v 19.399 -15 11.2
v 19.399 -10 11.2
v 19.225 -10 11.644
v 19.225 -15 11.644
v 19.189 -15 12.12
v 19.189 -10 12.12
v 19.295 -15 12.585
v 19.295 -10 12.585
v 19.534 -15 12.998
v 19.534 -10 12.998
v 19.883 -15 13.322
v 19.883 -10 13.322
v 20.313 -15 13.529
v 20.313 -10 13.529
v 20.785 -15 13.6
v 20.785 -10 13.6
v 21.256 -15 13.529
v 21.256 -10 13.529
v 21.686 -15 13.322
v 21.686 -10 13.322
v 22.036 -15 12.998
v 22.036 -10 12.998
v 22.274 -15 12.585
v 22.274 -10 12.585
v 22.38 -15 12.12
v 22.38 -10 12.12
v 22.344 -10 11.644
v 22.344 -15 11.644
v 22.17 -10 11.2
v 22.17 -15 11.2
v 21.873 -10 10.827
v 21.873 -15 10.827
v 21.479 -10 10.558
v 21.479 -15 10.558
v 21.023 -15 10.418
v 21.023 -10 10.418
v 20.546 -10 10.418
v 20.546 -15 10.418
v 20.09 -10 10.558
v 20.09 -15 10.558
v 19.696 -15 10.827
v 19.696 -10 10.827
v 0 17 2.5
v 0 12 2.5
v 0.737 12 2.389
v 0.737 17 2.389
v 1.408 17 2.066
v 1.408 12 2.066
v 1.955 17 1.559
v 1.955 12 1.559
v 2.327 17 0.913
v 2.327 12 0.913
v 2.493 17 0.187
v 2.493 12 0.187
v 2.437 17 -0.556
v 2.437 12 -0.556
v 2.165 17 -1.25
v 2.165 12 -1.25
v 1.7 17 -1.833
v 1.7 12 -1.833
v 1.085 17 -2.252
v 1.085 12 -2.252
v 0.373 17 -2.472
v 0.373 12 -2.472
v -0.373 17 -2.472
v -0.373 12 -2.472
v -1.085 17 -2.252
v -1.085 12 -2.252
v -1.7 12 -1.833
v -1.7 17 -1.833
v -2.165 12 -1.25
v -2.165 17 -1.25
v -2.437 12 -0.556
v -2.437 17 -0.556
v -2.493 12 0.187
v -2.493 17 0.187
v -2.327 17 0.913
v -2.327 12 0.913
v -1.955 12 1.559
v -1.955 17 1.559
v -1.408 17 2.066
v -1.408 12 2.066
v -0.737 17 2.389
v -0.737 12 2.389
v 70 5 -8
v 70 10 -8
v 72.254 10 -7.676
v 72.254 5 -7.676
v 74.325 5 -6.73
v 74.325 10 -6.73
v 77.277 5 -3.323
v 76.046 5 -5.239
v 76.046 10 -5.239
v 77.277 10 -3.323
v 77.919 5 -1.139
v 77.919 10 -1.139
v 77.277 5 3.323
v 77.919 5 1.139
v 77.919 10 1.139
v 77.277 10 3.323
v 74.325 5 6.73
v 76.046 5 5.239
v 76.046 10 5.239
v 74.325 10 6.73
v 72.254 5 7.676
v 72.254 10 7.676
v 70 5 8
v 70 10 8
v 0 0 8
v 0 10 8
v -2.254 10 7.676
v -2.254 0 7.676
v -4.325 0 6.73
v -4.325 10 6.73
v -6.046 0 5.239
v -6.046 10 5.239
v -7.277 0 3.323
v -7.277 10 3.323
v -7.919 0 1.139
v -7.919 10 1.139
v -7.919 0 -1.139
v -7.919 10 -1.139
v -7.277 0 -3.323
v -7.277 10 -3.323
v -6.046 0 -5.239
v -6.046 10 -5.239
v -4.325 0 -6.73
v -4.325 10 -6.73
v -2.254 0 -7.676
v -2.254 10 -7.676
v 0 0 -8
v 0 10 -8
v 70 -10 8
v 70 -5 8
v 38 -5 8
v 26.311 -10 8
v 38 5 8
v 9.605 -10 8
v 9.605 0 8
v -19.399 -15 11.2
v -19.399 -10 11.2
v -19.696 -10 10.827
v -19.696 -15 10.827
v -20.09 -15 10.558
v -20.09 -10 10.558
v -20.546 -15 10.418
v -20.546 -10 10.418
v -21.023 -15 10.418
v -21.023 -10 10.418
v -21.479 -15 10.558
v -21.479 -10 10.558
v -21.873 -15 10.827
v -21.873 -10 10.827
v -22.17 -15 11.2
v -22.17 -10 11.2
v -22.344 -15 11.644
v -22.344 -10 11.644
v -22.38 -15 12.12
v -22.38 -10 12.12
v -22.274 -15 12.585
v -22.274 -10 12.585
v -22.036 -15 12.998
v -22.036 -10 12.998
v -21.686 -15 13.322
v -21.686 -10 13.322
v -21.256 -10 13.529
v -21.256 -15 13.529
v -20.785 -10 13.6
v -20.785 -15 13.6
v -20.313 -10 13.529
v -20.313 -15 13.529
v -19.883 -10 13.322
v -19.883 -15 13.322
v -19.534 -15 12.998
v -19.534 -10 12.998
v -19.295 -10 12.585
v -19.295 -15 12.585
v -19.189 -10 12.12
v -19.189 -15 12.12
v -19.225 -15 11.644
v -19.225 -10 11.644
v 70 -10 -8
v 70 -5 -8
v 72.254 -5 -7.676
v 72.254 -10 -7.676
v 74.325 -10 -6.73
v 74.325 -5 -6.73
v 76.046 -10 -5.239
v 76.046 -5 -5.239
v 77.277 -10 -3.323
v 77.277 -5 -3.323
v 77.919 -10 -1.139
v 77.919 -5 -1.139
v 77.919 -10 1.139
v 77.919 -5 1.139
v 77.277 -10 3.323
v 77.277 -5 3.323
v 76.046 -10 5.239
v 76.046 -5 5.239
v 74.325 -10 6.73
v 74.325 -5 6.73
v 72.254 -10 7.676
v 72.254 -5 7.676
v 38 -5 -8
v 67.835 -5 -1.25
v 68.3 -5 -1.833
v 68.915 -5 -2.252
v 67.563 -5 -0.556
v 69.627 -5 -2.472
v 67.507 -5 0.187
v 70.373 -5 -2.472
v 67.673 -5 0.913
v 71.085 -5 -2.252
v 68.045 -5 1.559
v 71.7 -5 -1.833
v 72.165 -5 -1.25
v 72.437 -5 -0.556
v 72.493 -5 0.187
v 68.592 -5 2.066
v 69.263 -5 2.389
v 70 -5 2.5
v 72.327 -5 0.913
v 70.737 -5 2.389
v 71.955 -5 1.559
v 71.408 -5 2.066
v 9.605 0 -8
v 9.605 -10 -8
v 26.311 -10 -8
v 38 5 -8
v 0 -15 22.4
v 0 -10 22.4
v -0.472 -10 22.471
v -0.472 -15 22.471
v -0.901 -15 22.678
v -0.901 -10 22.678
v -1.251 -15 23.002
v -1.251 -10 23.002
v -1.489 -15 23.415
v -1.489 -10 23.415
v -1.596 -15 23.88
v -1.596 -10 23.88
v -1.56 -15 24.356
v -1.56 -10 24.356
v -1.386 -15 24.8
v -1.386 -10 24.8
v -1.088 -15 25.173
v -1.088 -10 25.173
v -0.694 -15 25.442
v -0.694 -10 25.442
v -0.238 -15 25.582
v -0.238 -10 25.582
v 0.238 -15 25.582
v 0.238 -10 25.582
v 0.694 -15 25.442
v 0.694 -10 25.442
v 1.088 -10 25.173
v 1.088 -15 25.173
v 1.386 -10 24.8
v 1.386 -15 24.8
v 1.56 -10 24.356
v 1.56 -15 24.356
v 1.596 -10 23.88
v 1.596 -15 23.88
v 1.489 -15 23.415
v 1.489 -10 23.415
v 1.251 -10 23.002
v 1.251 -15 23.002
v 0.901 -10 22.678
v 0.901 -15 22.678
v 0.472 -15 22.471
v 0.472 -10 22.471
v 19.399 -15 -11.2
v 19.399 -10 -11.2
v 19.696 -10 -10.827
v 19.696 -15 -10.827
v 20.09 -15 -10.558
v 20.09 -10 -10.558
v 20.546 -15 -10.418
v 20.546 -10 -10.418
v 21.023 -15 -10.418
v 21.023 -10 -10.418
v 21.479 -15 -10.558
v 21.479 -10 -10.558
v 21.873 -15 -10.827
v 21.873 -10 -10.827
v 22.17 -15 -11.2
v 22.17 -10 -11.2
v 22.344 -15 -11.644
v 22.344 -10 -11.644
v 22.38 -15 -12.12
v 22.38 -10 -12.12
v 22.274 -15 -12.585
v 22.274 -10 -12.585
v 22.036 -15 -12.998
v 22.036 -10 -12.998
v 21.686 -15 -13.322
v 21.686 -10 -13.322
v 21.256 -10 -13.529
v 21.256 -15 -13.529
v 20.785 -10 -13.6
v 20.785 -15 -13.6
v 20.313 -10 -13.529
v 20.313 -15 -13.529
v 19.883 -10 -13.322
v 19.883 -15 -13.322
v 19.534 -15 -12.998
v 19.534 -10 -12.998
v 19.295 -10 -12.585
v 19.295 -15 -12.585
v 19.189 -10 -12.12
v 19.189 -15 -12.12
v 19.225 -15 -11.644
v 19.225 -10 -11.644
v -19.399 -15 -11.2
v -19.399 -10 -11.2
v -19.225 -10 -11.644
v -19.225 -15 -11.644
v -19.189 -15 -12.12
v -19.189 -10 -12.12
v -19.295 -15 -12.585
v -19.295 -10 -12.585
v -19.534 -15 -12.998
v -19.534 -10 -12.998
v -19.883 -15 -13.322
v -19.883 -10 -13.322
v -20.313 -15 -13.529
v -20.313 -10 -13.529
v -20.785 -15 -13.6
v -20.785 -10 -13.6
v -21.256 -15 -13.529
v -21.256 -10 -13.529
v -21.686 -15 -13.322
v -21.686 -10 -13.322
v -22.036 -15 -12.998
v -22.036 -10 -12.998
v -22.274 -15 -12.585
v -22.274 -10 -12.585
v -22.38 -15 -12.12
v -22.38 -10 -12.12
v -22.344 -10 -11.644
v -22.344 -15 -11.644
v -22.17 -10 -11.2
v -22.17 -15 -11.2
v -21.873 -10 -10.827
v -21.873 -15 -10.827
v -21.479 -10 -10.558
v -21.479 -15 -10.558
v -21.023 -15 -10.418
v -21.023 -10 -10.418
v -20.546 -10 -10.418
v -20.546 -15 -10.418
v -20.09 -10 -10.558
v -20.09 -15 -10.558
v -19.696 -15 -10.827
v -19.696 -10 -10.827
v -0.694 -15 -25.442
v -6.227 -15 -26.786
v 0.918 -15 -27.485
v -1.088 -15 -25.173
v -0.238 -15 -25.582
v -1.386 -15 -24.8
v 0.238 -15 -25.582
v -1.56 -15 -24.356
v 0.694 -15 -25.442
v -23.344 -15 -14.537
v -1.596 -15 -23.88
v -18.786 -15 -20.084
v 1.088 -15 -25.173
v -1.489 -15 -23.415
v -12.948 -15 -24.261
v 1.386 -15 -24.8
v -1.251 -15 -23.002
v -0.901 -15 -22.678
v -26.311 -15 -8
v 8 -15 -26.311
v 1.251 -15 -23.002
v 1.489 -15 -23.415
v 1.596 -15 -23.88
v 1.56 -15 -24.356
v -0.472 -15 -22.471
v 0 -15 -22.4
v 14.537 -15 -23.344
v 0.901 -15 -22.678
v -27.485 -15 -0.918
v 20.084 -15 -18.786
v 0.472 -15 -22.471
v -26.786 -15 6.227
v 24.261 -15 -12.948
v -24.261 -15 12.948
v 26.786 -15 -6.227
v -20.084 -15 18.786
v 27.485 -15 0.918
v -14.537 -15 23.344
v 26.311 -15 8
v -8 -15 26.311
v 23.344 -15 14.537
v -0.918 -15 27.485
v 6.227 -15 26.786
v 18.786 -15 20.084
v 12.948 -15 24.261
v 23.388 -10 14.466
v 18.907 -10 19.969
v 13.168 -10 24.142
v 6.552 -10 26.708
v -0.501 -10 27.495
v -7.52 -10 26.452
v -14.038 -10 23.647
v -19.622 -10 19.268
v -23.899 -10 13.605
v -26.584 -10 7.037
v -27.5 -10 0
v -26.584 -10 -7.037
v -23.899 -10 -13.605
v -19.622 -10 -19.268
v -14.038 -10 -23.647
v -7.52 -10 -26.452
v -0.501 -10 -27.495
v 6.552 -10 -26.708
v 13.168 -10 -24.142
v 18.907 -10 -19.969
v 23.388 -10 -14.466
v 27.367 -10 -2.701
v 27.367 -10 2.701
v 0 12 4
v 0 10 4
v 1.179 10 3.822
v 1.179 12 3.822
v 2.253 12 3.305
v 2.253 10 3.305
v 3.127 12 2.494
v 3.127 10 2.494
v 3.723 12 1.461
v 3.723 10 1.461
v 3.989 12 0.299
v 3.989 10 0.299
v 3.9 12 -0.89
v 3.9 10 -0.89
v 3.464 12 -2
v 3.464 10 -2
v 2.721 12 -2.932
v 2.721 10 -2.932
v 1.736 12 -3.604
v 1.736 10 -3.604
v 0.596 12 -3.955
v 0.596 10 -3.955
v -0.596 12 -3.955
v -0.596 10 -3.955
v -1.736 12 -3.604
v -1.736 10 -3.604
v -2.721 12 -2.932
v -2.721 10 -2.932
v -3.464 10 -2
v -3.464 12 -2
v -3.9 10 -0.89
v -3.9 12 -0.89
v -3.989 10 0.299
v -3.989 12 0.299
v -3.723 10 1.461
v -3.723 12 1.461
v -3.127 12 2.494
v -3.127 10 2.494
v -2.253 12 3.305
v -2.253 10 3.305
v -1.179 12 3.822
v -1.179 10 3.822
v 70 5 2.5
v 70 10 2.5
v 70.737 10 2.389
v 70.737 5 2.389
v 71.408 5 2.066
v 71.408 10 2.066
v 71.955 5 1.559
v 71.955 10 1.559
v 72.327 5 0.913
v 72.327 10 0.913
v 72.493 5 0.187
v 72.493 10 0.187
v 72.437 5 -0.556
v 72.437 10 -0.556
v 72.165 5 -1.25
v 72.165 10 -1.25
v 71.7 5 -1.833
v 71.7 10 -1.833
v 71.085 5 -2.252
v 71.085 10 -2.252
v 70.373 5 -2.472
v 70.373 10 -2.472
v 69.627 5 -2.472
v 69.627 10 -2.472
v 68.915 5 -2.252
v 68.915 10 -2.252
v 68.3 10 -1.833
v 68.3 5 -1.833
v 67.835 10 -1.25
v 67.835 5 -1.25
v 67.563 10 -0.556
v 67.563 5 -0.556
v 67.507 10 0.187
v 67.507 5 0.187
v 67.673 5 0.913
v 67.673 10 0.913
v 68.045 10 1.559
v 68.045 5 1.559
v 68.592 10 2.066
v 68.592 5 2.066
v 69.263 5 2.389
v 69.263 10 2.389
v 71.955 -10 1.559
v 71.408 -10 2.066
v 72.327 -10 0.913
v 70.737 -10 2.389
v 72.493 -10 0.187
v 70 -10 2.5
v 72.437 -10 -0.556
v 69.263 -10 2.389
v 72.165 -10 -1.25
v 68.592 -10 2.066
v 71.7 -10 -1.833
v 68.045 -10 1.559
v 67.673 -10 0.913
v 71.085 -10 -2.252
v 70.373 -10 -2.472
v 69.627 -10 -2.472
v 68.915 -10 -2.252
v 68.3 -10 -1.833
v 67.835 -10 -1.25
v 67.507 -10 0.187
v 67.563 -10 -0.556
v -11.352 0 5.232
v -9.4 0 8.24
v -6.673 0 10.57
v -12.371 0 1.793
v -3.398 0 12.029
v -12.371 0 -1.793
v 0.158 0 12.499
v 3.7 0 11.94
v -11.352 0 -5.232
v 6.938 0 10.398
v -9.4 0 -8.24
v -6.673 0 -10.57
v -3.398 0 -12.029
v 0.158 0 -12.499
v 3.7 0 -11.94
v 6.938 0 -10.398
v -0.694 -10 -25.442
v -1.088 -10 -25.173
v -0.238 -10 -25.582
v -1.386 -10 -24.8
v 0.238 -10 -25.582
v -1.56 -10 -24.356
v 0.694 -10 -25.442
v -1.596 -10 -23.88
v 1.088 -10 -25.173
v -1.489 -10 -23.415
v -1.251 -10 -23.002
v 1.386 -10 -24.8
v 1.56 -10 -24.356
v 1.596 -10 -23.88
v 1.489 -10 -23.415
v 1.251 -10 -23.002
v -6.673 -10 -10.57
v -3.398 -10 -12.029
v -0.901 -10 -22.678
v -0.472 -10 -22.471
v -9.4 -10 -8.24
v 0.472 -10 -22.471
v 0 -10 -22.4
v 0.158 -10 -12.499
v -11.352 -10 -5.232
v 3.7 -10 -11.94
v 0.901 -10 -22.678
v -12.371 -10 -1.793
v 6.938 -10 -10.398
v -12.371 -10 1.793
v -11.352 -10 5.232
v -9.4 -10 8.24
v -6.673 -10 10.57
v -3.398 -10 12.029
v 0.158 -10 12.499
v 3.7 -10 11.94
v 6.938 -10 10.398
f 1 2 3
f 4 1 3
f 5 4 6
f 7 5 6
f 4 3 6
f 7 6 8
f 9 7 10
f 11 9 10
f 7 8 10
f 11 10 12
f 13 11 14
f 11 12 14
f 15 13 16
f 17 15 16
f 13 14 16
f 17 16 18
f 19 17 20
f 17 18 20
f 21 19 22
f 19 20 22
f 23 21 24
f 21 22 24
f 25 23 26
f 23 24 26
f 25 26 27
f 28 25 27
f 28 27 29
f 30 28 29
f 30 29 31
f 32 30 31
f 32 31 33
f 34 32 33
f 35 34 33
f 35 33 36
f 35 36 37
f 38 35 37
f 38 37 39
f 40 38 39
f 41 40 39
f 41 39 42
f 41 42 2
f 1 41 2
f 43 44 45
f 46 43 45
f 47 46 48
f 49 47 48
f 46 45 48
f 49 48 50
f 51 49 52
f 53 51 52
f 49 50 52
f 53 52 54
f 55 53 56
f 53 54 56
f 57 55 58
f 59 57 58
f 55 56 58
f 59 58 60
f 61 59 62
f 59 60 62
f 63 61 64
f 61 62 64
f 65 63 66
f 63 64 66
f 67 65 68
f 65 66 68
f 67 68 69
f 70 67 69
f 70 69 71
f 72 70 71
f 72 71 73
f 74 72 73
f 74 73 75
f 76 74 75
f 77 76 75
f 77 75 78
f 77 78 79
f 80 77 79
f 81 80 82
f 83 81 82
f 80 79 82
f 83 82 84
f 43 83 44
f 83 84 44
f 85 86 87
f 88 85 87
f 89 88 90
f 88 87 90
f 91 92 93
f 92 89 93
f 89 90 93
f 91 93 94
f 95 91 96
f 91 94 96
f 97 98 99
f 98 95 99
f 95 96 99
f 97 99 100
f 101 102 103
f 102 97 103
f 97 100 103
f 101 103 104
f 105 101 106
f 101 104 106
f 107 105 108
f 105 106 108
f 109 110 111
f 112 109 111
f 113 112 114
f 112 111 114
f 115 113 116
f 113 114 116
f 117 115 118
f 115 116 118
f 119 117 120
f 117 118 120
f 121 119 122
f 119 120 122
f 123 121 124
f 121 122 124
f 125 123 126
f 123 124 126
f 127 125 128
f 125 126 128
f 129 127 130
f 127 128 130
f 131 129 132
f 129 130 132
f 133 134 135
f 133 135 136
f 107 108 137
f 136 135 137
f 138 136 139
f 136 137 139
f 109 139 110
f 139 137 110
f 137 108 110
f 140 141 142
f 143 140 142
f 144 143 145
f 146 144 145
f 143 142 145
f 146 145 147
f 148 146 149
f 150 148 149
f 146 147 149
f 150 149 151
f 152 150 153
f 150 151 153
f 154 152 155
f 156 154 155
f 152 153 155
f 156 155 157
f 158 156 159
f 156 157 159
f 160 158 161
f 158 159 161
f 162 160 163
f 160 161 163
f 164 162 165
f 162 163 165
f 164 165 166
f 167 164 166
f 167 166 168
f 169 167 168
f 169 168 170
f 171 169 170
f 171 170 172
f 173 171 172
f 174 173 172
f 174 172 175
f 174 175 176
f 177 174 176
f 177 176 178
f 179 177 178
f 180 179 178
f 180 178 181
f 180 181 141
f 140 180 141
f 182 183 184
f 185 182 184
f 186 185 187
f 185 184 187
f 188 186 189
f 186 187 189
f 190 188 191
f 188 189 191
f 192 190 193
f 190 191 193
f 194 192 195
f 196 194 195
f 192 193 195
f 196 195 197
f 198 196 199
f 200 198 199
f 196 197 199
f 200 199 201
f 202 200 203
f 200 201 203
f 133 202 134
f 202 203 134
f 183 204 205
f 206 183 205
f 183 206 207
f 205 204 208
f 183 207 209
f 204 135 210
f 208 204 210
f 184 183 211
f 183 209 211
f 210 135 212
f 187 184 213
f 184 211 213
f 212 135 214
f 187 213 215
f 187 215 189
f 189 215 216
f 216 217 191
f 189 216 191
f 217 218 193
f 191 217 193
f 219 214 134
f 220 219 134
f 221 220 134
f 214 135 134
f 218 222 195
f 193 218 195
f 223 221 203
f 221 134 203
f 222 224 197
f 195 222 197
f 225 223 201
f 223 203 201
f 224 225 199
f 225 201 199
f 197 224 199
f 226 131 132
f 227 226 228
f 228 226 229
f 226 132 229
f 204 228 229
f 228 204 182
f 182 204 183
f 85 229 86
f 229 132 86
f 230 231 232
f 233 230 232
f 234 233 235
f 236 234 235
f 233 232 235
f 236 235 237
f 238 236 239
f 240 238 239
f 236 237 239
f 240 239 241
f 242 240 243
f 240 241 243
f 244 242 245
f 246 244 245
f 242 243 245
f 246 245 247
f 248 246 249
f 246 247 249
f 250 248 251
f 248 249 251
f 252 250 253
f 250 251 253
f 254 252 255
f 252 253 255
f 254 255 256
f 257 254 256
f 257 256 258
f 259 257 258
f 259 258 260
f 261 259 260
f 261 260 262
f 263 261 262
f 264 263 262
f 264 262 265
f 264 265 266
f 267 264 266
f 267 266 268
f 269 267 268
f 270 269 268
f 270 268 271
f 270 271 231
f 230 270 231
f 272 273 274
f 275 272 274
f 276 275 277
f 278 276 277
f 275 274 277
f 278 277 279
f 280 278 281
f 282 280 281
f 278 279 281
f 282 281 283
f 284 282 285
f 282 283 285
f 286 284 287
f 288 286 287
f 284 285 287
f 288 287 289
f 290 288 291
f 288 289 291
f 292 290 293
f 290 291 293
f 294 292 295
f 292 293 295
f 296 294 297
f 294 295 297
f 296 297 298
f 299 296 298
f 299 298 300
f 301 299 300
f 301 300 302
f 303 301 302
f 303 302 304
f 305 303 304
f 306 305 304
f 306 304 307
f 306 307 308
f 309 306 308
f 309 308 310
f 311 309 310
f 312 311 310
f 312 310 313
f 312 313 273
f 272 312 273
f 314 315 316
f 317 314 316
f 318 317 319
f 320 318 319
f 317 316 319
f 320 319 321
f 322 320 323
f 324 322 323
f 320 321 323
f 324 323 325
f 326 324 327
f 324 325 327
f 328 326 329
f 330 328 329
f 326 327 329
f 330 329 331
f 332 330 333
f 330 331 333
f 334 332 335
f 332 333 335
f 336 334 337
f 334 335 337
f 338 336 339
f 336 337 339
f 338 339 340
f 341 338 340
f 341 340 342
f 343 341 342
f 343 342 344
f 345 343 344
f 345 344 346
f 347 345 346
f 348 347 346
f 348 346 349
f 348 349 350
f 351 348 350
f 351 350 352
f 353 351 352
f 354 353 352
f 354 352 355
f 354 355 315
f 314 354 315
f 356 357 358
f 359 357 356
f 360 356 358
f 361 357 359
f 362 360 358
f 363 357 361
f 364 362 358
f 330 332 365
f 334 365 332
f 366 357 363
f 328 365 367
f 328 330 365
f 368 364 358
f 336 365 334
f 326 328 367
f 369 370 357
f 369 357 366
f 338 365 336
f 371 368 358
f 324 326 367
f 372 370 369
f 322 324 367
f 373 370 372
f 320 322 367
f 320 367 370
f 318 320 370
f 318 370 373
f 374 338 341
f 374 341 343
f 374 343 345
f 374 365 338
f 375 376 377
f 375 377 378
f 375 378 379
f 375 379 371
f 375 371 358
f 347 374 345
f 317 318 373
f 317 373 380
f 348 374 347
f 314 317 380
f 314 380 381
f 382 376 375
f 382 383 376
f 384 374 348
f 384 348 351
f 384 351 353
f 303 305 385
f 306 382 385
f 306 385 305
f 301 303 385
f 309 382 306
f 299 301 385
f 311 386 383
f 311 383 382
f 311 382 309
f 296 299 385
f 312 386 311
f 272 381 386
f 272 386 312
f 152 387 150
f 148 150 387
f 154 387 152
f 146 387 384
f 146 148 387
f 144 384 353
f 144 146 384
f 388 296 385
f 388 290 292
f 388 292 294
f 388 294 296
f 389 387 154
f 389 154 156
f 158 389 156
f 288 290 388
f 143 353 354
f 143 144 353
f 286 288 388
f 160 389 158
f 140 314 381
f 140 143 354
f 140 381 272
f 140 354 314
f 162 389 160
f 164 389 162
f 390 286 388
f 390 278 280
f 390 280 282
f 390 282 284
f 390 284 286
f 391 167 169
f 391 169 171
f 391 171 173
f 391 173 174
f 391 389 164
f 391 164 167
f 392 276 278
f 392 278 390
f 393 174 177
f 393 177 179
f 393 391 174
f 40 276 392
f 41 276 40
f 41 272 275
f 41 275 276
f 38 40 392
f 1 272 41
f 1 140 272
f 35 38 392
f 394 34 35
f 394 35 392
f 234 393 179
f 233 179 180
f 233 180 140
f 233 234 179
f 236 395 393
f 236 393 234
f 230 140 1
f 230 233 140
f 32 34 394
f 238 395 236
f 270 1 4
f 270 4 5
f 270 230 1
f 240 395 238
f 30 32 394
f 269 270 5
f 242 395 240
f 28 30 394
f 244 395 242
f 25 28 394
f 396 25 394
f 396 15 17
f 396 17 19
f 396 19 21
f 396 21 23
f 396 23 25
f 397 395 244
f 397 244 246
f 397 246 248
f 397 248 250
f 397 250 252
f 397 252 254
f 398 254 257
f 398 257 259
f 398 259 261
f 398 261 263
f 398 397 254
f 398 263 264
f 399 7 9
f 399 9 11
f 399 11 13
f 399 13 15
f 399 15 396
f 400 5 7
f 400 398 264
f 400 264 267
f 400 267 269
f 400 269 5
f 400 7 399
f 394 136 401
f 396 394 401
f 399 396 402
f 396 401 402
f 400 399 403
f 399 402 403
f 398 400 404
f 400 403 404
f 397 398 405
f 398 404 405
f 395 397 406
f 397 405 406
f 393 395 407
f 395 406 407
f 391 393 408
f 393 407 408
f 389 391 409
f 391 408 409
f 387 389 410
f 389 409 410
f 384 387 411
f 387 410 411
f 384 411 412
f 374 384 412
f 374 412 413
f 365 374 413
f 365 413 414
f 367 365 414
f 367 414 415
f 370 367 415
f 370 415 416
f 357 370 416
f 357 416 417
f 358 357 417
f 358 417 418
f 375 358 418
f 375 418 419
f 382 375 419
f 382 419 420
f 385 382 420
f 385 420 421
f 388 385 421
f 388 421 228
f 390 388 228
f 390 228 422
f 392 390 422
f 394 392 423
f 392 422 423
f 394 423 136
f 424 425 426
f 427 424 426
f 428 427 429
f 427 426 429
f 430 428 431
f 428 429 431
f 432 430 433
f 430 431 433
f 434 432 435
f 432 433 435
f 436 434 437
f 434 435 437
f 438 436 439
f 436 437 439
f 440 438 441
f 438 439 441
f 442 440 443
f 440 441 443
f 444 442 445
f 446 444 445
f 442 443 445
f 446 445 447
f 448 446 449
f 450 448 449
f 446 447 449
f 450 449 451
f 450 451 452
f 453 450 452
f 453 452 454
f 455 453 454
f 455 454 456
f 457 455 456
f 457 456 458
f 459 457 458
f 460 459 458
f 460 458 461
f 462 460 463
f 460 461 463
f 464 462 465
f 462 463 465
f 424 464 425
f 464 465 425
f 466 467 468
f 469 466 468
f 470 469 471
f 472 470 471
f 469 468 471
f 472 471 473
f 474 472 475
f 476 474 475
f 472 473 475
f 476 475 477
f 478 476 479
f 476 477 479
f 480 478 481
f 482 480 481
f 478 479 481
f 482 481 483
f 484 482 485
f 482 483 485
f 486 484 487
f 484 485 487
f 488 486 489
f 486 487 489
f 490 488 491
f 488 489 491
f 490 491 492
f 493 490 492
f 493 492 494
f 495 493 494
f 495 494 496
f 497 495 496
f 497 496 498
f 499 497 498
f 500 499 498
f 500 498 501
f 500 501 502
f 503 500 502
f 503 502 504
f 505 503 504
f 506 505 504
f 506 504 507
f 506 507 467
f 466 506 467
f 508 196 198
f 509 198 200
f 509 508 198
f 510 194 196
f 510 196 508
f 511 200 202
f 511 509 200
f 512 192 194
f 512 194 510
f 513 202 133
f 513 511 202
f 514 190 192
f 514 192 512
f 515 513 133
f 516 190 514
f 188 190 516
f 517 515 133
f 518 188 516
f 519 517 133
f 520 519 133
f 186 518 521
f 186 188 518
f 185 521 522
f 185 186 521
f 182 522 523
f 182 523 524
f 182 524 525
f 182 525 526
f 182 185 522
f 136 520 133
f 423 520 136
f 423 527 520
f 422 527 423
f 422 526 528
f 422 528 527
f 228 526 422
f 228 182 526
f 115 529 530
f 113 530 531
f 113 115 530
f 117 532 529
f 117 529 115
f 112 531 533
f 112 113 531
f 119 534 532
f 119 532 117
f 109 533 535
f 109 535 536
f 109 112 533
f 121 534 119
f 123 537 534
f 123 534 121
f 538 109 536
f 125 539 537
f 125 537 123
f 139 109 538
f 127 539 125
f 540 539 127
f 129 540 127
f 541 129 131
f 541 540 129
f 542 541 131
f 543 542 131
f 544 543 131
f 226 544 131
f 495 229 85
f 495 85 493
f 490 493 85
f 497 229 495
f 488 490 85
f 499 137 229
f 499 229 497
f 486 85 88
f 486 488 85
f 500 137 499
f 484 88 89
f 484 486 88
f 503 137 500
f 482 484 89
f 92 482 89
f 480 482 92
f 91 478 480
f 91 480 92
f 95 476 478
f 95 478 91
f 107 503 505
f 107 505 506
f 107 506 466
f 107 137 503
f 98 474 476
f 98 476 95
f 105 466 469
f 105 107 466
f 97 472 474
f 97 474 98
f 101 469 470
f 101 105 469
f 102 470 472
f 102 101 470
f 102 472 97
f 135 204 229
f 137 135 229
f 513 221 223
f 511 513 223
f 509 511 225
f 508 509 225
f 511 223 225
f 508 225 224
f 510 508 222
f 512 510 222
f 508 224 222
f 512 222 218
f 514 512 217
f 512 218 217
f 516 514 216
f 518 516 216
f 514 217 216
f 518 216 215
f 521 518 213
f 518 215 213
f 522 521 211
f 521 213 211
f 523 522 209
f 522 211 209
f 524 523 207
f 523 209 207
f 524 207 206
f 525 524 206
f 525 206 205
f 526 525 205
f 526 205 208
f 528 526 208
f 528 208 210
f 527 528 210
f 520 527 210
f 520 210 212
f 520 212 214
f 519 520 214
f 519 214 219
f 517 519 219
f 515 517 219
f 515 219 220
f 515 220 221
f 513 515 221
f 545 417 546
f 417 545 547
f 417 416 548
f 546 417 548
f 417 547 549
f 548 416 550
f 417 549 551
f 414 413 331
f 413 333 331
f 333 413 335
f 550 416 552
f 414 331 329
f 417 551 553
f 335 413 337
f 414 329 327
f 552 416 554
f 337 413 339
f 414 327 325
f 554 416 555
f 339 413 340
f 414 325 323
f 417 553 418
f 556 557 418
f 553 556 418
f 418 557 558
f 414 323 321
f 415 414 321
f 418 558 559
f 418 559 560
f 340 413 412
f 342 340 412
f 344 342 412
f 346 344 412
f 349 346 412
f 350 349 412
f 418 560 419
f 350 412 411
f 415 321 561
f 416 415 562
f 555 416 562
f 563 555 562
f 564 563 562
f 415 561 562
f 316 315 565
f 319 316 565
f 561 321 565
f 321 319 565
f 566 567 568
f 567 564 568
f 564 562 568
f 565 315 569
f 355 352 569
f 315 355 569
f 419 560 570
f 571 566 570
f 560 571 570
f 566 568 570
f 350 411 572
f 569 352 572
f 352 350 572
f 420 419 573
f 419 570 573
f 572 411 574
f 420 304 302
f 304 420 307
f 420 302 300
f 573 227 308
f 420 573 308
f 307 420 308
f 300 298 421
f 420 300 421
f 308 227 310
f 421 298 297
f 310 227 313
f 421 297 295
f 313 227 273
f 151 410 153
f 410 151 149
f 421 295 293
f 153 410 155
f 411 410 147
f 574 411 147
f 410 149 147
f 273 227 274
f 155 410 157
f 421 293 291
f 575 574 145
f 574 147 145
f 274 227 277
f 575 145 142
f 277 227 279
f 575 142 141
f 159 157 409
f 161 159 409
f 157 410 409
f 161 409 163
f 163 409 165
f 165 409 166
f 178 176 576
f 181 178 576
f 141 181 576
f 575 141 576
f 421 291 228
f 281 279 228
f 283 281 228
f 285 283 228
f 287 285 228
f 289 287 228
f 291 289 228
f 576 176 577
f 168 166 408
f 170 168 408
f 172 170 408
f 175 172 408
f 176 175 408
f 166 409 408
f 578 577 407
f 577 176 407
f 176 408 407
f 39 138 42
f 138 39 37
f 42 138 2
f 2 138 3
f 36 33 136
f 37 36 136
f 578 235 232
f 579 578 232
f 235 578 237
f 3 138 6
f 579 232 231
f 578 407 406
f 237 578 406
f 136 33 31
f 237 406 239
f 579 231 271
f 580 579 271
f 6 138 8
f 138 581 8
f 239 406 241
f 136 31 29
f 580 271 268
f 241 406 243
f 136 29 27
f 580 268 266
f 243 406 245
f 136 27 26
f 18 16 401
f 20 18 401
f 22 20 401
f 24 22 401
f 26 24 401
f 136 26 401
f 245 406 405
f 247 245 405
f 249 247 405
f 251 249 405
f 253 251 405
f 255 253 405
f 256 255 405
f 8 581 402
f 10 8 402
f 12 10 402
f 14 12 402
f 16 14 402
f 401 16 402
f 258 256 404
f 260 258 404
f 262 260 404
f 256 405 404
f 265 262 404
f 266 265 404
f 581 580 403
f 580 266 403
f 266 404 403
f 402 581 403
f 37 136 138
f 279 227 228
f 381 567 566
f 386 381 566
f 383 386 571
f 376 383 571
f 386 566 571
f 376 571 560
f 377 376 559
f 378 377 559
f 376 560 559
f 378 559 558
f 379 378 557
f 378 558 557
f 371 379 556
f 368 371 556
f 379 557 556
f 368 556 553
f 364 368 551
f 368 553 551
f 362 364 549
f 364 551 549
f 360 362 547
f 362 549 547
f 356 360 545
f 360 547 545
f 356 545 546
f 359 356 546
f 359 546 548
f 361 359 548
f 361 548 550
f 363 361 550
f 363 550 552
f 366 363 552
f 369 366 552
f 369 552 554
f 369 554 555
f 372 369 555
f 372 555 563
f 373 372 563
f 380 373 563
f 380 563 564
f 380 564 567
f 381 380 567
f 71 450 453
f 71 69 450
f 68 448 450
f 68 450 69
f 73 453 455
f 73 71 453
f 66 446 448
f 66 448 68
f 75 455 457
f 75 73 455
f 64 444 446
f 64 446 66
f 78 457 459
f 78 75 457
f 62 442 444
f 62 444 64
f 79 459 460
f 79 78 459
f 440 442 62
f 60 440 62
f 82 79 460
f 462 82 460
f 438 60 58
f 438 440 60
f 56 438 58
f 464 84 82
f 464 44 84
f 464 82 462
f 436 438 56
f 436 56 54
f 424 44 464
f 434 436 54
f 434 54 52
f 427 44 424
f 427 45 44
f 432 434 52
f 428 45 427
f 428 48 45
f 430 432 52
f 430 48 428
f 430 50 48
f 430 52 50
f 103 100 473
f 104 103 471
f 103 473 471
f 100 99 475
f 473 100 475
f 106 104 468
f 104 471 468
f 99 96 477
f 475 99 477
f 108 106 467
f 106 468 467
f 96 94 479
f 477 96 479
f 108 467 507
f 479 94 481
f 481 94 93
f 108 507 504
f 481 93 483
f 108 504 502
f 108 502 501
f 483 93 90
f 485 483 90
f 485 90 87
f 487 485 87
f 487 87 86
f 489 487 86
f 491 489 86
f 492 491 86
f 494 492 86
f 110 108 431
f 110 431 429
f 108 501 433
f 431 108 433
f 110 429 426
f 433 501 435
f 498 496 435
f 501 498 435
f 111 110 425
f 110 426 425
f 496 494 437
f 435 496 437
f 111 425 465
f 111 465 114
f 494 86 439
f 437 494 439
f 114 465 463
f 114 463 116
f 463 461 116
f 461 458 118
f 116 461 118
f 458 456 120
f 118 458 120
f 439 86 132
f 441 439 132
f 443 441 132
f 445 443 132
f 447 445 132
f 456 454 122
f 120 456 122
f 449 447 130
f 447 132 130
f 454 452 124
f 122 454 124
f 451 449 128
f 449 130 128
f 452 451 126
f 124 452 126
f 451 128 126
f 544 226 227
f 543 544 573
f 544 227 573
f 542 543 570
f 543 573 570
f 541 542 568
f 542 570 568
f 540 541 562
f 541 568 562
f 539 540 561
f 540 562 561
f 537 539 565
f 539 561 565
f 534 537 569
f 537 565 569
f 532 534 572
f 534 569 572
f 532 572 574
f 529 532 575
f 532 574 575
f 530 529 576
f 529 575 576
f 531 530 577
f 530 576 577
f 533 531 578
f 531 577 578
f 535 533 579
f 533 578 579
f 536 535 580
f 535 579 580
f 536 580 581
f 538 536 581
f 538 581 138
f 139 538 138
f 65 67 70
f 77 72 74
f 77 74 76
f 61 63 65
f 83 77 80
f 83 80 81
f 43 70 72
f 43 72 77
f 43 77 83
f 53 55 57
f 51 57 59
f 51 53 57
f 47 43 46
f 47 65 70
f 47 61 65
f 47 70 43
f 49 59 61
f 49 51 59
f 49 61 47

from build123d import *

# Parameters (mm, degrees)
EXTRUDE_1_DEPTH          = 10
CUT_EXTRUDE_1_REACH      = 82.25
SKETCH_3_W               = 40
SKETCH_3_H               = 10
CUT_EXTRUDE_2_REACH      = 82.92
SKETCH_4_R               = 2.5
SKETCH_5_R               = 27.5
EXTRUDE_2_DEPTH          = 5
CUT_EXTRUDE_3_REACH      = 87.09
SKETCH_6_R               = 1.6
PATTERN_CIRCULAR_1_COUNT = 6
SKETCH_7_R               = 12.5
EXTRUDE_3_DEPTH          = 10
SKETCH_8_R               = 4
EXTRUDE_4_DEPTH          = 2
SKETCH_9_R               = 2.5
EXTRUDE_5_DEPTH          = 5


with BuildPart() as part:
    # 草图2 → 凸台-拉伸1 (new, symmetric)
    with BuildSketch(Plane(origin=(0, 0, 0), x_dir=(1, 0, 0), z_dir=(0, 1, 0))):
        with BuildLine():
            Line((0, 8), (70, 8))
            ThreePointArc((70, 8), (78, 0), (70, -8))
            Line((70, -8), (0, -8))
            ThreePointArc((0, -8), (-8, 0), (0, 8))
        make_face()
    extrude(amount=EXTRUDE_1_DEPTH, both=True)

    # 草图3 → 切除-拉伸1 (cut, up to next)
    with BuildSketch(Plane.XY.offset(8), mode=Mode.PRIVATE) as cut_extrude_1_sk1:
        with Locations((58, 0)):
            Rectangle(SKETCH_3_W, SKETCH_3_H)
    cut_extrude_1_tool1 = extrude(cut_extrude_1_sk1.sketch, amount=-CUT_EXTRUDE_1_REACH, mode=Mode.PRIVATE) & part.part
    add(cut_extrude_1_tool1.solids().sort_by_distance((58, 0, 8))[0], mode=Mode.SUBTRACT)

    # 切除-拉伸2: up to this face of the body (flat: up to its plane)
    cut_extrude_2_end = Plane(part.part.faces().sort_by_distance((35, -10, 0))[0])
    # 草图4 → 切除-拉伸2 (cut, up to the picked face)
    with BuildSketch(Plane(origin=(0, 10, 0), x_dir=(1, 0, 0), z_dir=(0, 1, 0)), mode=Mode.PRIVATE) as cut_extrude_2_sk1:
        with Locations(Location((70, 0, 0), (0, 0, 270))):
            Circle(SKETCH_4_R)
    cut_extrude_2_tool1 = split(extrude(cut_extrude_2_sk1.sketch, amount=-CUT_EXTRUDE_2_REACH, mode=Mode.PRIVATE), bisect_by=cut_extrude_2_end, keep=Keep.BOTH, mode=Mode.PRIVATE)
    add(cut_extrude_2_tool1.solids().sort_by(Axis((70, 10, 0), (0, -1, 0)))[0], mode=Mode.SUBTRACT)

    # 草图5 → 凸台-拉伸2 (add)
    with BuildSketch(Plane.XZ.offset(10)):
        with Locations(Location((0, 0, 0), (0, 0, 16.912389803))):
            Circle(SKETCH_5_R)
    extrude(amount=EXTRUDE_2_DEPTH)

    # 草图6 → 切除-拉伸3 (cut, up to next)
    with BuildSketch(Plane(origin=(0, -10, 0), x_dir=(1, 0, 0), z_dir=(0, 1, 0)), mode=Mode.PRIVATE) as cut_extrude_3_sk1:
        with Locations(Location((0, 24, 0), (0, 0, 270))):
            Circle(SKETCH_6_R)
    cut_extrude_3_tool1 = extrude(cut_extrude_3_sk1.sketch, amount=-CUT_EXTRUDE_3_REACH, mode=Mode.PRIVATE) & part.part
    cut_extrude_3 = cut_extrude_3_tool1.solids().sort_by_distance((0, -10, -24))[0]
    add(cut_extrude_3, mode=Mode.SUBTRACT)

    # 阵列(圆周)1: 切除-拉伸3 ×6 about axis
    pattern_circular_1_axis = Axis((0, 0, 0), (0, 1, 0))
    for i in range(1, PATTERN_CIRCULAR_1_COUNT):
        add(cut_extrude_3.rotate(pattern_circular_1_axis, i * 360 / PATTERN_CIRCULAR_1_COUNT), mode=Mode.SUBTRACT)

    # 草图7 → 凸台-拉伸3 (add)
    with BuildSketch(Plane(origin=(0, -10, 0), x_dir=(1, 0, 0), z_dir=(0, 1, 0))):
        Circle(SKETCH_7_R)
    extrude(amount=EXTRUDE_3_DEPTH)

    # 草图8 → 凸台-拉伸4 (add)
    with BuildSketch(Plane(origin=(0, 10, 0), x_dir=(1, 0, 0), z_dir=(0, 1, 0))):
        with Locations(Location((0, 0, 0), (0, 0, 270))):
            Circle(SKETCH_8_R)
    extrude(amount=EXTRUDE_4_DEPTH)

    # 草图9 → 凸台-拉伸5 (add)
    with BuildSketch(Plane(origin=(0, 12, 0), x_dir=(1, 0, 0), z_dir=(0, 1, 0))):
        with Locations(Location((0, 0, 0), (0, 0, 270))):
            Circle(SKETCH_9_R)
    extrude(amount=EXTRUDE_5_DEPTH)


solid = part.part
